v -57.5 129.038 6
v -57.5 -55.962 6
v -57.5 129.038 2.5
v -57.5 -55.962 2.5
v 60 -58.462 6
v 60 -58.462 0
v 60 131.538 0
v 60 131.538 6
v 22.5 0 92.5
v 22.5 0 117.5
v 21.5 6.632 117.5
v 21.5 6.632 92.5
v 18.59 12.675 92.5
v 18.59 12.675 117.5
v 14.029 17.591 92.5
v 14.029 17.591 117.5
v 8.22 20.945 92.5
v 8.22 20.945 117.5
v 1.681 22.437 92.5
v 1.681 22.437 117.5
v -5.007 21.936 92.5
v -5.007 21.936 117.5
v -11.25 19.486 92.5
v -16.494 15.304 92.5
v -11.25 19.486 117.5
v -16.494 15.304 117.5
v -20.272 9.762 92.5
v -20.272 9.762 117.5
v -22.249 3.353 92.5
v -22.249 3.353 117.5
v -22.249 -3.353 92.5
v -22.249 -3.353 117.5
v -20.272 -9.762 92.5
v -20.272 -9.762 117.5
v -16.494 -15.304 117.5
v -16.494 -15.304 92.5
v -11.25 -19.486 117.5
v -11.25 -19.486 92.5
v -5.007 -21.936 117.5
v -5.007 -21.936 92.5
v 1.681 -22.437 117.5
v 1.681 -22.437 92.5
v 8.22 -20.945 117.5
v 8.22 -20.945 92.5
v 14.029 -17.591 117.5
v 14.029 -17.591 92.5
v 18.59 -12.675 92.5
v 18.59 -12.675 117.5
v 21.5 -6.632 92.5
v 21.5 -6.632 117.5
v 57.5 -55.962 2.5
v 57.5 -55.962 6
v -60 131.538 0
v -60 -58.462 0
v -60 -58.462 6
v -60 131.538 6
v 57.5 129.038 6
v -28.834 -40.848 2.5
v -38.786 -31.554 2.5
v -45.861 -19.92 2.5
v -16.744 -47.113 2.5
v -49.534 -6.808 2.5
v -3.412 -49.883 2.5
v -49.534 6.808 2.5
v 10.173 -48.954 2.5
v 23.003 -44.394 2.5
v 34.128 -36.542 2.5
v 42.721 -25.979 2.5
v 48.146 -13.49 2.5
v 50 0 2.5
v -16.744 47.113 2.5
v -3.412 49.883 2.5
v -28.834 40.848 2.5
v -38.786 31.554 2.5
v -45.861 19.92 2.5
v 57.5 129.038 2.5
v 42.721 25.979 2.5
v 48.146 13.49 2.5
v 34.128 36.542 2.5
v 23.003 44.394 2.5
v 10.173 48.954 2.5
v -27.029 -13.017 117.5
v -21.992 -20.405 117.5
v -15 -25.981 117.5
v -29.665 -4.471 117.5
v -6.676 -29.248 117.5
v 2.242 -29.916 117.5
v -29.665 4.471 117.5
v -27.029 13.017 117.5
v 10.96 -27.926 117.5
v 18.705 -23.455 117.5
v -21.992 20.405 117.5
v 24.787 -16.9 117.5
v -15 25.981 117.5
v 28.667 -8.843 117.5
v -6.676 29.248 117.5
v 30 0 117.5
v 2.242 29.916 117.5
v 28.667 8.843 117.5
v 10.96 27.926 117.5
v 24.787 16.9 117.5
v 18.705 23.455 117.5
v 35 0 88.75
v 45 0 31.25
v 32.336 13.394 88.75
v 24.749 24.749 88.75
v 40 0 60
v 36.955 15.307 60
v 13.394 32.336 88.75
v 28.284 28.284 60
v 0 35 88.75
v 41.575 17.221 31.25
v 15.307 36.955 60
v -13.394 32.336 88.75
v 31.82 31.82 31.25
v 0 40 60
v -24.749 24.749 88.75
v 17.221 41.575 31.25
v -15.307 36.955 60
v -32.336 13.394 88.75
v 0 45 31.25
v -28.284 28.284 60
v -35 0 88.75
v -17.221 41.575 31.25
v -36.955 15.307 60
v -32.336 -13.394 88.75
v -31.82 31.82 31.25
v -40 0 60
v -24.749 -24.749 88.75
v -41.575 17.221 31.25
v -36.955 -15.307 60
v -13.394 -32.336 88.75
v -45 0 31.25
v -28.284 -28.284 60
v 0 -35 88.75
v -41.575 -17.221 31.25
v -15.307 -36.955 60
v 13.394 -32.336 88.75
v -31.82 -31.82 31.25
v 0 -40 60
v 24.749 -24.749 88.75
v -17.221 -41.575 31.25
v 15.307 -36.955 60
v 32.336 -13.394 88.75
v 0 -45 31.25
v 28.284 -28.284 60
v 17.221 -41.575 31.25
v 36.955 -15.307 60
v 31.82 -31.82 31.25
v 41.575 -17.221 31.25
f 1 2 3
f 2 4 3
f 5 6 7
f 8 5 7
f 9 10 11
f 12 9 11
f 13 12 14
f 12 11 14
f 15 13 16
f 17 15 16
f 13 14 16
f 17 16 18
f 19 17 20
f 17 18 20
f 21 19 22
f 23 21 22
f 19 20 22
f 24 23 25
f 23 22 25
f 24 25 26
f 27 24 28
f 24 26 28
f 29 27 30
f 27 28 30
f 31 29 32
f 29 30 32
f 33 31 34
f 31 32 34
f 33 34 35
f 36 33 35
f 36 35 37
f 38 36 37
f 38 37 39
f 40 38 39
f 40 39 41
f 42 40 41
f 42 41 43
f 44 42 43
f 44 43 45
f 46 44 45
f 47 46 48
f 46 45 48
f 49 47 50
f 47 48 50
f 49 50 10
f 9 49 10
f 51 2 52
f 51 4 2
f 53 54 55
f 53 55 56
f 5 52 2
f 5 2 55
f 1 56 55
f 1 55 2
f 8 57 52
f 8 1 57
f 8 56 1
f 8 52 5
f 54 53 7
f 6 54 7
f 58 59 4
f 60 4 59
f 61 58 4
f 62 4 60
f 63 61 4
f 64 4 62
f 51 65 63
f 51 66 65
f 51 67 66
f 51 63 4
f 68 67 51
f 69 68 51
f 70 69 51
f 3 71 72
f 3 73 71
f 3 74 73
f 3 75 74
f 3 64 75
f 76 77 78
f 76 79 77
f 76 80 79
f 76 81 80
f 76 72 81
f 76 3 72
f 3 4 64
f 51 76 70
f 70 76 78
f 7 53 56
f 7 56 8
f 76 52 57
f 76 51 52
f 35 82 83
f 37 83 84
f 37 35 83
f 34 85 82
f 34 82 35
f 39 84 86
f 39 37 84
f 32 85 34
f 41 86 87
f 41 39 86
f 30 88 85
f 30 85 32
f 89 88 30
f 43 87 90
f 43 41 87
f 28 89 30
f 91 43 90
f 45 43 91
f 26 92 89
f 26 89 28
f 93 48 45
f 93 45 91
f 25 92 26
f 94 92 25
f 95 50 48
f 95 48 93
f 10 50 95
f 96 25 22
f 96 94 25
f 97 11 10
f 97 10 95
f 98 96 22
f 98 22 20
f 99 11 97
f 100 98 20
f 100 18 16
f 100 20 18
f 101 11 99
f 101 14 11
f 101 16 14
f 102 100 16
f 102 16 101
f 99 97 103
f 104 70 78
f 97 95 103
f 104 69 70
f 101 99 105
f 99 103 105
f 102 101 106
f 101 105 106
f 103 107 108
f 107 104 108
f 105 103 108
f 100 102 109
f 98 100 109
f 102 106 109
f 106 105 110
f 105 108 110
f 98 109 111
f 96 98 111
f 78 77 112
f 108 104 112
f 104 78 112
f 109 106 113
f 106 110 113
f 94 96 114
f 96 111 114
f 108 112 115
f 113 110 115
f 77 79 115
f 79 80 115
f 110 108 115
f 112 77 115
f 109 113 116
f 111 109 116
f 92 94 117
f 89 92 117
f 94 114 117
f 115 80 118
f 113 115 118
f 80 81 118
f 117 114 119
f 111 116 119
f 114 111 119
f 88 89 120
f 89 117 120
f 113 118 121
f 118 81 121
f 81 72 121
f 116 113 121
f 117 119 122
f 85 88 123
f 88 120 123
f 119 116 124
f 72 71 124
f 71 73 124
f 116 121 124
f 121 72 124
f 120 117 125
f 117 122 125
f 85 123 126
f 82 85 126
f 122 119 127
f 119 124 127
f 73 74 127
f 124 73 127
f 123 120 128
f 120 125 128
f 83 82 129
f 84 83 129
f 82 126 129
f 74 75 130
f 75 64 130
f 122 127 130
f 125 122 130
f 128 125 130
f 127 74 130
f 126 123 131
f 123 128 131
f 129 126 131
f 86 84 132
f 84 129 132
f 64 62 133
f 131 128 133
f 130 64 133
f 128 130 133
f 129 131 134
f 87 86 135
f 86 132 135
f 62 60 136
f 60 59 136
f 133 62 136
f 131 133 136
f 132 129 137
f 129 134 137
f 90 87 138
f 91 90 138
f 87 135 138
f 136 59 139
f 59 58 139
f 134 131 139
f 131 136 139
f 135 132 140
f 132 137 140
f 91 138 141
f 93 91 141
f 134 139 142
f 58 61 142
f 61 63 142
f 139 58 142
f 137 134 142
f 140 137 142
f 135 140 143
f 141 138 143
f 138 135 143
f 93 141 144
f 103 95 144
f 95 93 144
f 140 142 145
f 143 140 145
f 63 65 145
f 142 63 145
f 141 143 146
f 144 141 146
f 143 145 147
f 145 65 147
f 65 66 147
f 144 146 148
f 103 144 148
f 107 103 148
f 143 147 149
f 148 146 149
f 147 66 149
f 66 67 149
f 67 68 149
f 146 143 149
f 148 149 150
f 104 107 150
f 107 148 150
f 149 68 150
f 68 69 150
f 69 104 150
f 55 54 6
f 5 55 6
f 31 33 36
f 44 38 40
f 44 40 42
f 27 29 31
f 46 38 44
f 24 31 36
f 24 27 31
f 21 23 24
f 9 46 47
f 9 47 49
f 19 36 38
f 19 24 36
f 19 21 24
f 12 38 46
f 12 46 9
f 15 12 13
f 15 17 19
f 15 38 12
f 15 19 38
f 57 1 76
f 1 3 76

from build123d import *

# Parameters (mm, degrees)
F0_W     = 120
F0_H     = 190
F1_DEPTH = 6
F2_T     = -2.5
F3_R     = 50
F4_DEPTH = 115
F5_SIZE2 = 114.99999
F5_SIZE  = 19.99999
F6_R     = 22.5
F7_DEPTH = 25


# Not quite as in the source:
# - a fillet or chamfer is up to 0.001 mm smaller than in the source, because OpenCascade refuses the exact size


with BuildPart() as f1:
    # F0 (on Top) → F1 (new body)
    with BuildSketch(Plane.XY):
        with Locations((0, 36.5384568274)):
            Rectangle(F0_W, F0_H)
    extrude(amount=F1_DEPTH)

    # F2
    f2_openings = [f1.faces().sort_by_distance(p)[0] for p in [
        (0, 36.538457, 6),
    ]]
    offset(amount=F2_T, openings=f2_openings)

    # F3 (on face) → F4 (join)
    with BuildSketch(Plane.XY.offset(2.5)):
        Circle(F3_R)
    extrude(amount=F4_DEPTH)

    # F5 (size 20 and 115 in the source; OpenCascade refuses exactly that, so slightly less here)
    f5_edges = [f1.edges().sort_by_distance(p)[0] for p in [
        (-50, 0, 117.5),
    ]]
    f5_side = f1.faces().sort_by_distance((0, 0, 117.5))[0]
    chamfer(f5_edges, length=F5_SIZE, length2=F5_SIZE2, reference=f5_side)

    # F6 (on face) → F7 (cut)
    with BuildSketch(Plane.XY.offset(117.5)):
        Circle(F6_R)
    extrude(amount=-F7_DEPTH, mode=Mode.SUBTRACT)


solid = f1.part
